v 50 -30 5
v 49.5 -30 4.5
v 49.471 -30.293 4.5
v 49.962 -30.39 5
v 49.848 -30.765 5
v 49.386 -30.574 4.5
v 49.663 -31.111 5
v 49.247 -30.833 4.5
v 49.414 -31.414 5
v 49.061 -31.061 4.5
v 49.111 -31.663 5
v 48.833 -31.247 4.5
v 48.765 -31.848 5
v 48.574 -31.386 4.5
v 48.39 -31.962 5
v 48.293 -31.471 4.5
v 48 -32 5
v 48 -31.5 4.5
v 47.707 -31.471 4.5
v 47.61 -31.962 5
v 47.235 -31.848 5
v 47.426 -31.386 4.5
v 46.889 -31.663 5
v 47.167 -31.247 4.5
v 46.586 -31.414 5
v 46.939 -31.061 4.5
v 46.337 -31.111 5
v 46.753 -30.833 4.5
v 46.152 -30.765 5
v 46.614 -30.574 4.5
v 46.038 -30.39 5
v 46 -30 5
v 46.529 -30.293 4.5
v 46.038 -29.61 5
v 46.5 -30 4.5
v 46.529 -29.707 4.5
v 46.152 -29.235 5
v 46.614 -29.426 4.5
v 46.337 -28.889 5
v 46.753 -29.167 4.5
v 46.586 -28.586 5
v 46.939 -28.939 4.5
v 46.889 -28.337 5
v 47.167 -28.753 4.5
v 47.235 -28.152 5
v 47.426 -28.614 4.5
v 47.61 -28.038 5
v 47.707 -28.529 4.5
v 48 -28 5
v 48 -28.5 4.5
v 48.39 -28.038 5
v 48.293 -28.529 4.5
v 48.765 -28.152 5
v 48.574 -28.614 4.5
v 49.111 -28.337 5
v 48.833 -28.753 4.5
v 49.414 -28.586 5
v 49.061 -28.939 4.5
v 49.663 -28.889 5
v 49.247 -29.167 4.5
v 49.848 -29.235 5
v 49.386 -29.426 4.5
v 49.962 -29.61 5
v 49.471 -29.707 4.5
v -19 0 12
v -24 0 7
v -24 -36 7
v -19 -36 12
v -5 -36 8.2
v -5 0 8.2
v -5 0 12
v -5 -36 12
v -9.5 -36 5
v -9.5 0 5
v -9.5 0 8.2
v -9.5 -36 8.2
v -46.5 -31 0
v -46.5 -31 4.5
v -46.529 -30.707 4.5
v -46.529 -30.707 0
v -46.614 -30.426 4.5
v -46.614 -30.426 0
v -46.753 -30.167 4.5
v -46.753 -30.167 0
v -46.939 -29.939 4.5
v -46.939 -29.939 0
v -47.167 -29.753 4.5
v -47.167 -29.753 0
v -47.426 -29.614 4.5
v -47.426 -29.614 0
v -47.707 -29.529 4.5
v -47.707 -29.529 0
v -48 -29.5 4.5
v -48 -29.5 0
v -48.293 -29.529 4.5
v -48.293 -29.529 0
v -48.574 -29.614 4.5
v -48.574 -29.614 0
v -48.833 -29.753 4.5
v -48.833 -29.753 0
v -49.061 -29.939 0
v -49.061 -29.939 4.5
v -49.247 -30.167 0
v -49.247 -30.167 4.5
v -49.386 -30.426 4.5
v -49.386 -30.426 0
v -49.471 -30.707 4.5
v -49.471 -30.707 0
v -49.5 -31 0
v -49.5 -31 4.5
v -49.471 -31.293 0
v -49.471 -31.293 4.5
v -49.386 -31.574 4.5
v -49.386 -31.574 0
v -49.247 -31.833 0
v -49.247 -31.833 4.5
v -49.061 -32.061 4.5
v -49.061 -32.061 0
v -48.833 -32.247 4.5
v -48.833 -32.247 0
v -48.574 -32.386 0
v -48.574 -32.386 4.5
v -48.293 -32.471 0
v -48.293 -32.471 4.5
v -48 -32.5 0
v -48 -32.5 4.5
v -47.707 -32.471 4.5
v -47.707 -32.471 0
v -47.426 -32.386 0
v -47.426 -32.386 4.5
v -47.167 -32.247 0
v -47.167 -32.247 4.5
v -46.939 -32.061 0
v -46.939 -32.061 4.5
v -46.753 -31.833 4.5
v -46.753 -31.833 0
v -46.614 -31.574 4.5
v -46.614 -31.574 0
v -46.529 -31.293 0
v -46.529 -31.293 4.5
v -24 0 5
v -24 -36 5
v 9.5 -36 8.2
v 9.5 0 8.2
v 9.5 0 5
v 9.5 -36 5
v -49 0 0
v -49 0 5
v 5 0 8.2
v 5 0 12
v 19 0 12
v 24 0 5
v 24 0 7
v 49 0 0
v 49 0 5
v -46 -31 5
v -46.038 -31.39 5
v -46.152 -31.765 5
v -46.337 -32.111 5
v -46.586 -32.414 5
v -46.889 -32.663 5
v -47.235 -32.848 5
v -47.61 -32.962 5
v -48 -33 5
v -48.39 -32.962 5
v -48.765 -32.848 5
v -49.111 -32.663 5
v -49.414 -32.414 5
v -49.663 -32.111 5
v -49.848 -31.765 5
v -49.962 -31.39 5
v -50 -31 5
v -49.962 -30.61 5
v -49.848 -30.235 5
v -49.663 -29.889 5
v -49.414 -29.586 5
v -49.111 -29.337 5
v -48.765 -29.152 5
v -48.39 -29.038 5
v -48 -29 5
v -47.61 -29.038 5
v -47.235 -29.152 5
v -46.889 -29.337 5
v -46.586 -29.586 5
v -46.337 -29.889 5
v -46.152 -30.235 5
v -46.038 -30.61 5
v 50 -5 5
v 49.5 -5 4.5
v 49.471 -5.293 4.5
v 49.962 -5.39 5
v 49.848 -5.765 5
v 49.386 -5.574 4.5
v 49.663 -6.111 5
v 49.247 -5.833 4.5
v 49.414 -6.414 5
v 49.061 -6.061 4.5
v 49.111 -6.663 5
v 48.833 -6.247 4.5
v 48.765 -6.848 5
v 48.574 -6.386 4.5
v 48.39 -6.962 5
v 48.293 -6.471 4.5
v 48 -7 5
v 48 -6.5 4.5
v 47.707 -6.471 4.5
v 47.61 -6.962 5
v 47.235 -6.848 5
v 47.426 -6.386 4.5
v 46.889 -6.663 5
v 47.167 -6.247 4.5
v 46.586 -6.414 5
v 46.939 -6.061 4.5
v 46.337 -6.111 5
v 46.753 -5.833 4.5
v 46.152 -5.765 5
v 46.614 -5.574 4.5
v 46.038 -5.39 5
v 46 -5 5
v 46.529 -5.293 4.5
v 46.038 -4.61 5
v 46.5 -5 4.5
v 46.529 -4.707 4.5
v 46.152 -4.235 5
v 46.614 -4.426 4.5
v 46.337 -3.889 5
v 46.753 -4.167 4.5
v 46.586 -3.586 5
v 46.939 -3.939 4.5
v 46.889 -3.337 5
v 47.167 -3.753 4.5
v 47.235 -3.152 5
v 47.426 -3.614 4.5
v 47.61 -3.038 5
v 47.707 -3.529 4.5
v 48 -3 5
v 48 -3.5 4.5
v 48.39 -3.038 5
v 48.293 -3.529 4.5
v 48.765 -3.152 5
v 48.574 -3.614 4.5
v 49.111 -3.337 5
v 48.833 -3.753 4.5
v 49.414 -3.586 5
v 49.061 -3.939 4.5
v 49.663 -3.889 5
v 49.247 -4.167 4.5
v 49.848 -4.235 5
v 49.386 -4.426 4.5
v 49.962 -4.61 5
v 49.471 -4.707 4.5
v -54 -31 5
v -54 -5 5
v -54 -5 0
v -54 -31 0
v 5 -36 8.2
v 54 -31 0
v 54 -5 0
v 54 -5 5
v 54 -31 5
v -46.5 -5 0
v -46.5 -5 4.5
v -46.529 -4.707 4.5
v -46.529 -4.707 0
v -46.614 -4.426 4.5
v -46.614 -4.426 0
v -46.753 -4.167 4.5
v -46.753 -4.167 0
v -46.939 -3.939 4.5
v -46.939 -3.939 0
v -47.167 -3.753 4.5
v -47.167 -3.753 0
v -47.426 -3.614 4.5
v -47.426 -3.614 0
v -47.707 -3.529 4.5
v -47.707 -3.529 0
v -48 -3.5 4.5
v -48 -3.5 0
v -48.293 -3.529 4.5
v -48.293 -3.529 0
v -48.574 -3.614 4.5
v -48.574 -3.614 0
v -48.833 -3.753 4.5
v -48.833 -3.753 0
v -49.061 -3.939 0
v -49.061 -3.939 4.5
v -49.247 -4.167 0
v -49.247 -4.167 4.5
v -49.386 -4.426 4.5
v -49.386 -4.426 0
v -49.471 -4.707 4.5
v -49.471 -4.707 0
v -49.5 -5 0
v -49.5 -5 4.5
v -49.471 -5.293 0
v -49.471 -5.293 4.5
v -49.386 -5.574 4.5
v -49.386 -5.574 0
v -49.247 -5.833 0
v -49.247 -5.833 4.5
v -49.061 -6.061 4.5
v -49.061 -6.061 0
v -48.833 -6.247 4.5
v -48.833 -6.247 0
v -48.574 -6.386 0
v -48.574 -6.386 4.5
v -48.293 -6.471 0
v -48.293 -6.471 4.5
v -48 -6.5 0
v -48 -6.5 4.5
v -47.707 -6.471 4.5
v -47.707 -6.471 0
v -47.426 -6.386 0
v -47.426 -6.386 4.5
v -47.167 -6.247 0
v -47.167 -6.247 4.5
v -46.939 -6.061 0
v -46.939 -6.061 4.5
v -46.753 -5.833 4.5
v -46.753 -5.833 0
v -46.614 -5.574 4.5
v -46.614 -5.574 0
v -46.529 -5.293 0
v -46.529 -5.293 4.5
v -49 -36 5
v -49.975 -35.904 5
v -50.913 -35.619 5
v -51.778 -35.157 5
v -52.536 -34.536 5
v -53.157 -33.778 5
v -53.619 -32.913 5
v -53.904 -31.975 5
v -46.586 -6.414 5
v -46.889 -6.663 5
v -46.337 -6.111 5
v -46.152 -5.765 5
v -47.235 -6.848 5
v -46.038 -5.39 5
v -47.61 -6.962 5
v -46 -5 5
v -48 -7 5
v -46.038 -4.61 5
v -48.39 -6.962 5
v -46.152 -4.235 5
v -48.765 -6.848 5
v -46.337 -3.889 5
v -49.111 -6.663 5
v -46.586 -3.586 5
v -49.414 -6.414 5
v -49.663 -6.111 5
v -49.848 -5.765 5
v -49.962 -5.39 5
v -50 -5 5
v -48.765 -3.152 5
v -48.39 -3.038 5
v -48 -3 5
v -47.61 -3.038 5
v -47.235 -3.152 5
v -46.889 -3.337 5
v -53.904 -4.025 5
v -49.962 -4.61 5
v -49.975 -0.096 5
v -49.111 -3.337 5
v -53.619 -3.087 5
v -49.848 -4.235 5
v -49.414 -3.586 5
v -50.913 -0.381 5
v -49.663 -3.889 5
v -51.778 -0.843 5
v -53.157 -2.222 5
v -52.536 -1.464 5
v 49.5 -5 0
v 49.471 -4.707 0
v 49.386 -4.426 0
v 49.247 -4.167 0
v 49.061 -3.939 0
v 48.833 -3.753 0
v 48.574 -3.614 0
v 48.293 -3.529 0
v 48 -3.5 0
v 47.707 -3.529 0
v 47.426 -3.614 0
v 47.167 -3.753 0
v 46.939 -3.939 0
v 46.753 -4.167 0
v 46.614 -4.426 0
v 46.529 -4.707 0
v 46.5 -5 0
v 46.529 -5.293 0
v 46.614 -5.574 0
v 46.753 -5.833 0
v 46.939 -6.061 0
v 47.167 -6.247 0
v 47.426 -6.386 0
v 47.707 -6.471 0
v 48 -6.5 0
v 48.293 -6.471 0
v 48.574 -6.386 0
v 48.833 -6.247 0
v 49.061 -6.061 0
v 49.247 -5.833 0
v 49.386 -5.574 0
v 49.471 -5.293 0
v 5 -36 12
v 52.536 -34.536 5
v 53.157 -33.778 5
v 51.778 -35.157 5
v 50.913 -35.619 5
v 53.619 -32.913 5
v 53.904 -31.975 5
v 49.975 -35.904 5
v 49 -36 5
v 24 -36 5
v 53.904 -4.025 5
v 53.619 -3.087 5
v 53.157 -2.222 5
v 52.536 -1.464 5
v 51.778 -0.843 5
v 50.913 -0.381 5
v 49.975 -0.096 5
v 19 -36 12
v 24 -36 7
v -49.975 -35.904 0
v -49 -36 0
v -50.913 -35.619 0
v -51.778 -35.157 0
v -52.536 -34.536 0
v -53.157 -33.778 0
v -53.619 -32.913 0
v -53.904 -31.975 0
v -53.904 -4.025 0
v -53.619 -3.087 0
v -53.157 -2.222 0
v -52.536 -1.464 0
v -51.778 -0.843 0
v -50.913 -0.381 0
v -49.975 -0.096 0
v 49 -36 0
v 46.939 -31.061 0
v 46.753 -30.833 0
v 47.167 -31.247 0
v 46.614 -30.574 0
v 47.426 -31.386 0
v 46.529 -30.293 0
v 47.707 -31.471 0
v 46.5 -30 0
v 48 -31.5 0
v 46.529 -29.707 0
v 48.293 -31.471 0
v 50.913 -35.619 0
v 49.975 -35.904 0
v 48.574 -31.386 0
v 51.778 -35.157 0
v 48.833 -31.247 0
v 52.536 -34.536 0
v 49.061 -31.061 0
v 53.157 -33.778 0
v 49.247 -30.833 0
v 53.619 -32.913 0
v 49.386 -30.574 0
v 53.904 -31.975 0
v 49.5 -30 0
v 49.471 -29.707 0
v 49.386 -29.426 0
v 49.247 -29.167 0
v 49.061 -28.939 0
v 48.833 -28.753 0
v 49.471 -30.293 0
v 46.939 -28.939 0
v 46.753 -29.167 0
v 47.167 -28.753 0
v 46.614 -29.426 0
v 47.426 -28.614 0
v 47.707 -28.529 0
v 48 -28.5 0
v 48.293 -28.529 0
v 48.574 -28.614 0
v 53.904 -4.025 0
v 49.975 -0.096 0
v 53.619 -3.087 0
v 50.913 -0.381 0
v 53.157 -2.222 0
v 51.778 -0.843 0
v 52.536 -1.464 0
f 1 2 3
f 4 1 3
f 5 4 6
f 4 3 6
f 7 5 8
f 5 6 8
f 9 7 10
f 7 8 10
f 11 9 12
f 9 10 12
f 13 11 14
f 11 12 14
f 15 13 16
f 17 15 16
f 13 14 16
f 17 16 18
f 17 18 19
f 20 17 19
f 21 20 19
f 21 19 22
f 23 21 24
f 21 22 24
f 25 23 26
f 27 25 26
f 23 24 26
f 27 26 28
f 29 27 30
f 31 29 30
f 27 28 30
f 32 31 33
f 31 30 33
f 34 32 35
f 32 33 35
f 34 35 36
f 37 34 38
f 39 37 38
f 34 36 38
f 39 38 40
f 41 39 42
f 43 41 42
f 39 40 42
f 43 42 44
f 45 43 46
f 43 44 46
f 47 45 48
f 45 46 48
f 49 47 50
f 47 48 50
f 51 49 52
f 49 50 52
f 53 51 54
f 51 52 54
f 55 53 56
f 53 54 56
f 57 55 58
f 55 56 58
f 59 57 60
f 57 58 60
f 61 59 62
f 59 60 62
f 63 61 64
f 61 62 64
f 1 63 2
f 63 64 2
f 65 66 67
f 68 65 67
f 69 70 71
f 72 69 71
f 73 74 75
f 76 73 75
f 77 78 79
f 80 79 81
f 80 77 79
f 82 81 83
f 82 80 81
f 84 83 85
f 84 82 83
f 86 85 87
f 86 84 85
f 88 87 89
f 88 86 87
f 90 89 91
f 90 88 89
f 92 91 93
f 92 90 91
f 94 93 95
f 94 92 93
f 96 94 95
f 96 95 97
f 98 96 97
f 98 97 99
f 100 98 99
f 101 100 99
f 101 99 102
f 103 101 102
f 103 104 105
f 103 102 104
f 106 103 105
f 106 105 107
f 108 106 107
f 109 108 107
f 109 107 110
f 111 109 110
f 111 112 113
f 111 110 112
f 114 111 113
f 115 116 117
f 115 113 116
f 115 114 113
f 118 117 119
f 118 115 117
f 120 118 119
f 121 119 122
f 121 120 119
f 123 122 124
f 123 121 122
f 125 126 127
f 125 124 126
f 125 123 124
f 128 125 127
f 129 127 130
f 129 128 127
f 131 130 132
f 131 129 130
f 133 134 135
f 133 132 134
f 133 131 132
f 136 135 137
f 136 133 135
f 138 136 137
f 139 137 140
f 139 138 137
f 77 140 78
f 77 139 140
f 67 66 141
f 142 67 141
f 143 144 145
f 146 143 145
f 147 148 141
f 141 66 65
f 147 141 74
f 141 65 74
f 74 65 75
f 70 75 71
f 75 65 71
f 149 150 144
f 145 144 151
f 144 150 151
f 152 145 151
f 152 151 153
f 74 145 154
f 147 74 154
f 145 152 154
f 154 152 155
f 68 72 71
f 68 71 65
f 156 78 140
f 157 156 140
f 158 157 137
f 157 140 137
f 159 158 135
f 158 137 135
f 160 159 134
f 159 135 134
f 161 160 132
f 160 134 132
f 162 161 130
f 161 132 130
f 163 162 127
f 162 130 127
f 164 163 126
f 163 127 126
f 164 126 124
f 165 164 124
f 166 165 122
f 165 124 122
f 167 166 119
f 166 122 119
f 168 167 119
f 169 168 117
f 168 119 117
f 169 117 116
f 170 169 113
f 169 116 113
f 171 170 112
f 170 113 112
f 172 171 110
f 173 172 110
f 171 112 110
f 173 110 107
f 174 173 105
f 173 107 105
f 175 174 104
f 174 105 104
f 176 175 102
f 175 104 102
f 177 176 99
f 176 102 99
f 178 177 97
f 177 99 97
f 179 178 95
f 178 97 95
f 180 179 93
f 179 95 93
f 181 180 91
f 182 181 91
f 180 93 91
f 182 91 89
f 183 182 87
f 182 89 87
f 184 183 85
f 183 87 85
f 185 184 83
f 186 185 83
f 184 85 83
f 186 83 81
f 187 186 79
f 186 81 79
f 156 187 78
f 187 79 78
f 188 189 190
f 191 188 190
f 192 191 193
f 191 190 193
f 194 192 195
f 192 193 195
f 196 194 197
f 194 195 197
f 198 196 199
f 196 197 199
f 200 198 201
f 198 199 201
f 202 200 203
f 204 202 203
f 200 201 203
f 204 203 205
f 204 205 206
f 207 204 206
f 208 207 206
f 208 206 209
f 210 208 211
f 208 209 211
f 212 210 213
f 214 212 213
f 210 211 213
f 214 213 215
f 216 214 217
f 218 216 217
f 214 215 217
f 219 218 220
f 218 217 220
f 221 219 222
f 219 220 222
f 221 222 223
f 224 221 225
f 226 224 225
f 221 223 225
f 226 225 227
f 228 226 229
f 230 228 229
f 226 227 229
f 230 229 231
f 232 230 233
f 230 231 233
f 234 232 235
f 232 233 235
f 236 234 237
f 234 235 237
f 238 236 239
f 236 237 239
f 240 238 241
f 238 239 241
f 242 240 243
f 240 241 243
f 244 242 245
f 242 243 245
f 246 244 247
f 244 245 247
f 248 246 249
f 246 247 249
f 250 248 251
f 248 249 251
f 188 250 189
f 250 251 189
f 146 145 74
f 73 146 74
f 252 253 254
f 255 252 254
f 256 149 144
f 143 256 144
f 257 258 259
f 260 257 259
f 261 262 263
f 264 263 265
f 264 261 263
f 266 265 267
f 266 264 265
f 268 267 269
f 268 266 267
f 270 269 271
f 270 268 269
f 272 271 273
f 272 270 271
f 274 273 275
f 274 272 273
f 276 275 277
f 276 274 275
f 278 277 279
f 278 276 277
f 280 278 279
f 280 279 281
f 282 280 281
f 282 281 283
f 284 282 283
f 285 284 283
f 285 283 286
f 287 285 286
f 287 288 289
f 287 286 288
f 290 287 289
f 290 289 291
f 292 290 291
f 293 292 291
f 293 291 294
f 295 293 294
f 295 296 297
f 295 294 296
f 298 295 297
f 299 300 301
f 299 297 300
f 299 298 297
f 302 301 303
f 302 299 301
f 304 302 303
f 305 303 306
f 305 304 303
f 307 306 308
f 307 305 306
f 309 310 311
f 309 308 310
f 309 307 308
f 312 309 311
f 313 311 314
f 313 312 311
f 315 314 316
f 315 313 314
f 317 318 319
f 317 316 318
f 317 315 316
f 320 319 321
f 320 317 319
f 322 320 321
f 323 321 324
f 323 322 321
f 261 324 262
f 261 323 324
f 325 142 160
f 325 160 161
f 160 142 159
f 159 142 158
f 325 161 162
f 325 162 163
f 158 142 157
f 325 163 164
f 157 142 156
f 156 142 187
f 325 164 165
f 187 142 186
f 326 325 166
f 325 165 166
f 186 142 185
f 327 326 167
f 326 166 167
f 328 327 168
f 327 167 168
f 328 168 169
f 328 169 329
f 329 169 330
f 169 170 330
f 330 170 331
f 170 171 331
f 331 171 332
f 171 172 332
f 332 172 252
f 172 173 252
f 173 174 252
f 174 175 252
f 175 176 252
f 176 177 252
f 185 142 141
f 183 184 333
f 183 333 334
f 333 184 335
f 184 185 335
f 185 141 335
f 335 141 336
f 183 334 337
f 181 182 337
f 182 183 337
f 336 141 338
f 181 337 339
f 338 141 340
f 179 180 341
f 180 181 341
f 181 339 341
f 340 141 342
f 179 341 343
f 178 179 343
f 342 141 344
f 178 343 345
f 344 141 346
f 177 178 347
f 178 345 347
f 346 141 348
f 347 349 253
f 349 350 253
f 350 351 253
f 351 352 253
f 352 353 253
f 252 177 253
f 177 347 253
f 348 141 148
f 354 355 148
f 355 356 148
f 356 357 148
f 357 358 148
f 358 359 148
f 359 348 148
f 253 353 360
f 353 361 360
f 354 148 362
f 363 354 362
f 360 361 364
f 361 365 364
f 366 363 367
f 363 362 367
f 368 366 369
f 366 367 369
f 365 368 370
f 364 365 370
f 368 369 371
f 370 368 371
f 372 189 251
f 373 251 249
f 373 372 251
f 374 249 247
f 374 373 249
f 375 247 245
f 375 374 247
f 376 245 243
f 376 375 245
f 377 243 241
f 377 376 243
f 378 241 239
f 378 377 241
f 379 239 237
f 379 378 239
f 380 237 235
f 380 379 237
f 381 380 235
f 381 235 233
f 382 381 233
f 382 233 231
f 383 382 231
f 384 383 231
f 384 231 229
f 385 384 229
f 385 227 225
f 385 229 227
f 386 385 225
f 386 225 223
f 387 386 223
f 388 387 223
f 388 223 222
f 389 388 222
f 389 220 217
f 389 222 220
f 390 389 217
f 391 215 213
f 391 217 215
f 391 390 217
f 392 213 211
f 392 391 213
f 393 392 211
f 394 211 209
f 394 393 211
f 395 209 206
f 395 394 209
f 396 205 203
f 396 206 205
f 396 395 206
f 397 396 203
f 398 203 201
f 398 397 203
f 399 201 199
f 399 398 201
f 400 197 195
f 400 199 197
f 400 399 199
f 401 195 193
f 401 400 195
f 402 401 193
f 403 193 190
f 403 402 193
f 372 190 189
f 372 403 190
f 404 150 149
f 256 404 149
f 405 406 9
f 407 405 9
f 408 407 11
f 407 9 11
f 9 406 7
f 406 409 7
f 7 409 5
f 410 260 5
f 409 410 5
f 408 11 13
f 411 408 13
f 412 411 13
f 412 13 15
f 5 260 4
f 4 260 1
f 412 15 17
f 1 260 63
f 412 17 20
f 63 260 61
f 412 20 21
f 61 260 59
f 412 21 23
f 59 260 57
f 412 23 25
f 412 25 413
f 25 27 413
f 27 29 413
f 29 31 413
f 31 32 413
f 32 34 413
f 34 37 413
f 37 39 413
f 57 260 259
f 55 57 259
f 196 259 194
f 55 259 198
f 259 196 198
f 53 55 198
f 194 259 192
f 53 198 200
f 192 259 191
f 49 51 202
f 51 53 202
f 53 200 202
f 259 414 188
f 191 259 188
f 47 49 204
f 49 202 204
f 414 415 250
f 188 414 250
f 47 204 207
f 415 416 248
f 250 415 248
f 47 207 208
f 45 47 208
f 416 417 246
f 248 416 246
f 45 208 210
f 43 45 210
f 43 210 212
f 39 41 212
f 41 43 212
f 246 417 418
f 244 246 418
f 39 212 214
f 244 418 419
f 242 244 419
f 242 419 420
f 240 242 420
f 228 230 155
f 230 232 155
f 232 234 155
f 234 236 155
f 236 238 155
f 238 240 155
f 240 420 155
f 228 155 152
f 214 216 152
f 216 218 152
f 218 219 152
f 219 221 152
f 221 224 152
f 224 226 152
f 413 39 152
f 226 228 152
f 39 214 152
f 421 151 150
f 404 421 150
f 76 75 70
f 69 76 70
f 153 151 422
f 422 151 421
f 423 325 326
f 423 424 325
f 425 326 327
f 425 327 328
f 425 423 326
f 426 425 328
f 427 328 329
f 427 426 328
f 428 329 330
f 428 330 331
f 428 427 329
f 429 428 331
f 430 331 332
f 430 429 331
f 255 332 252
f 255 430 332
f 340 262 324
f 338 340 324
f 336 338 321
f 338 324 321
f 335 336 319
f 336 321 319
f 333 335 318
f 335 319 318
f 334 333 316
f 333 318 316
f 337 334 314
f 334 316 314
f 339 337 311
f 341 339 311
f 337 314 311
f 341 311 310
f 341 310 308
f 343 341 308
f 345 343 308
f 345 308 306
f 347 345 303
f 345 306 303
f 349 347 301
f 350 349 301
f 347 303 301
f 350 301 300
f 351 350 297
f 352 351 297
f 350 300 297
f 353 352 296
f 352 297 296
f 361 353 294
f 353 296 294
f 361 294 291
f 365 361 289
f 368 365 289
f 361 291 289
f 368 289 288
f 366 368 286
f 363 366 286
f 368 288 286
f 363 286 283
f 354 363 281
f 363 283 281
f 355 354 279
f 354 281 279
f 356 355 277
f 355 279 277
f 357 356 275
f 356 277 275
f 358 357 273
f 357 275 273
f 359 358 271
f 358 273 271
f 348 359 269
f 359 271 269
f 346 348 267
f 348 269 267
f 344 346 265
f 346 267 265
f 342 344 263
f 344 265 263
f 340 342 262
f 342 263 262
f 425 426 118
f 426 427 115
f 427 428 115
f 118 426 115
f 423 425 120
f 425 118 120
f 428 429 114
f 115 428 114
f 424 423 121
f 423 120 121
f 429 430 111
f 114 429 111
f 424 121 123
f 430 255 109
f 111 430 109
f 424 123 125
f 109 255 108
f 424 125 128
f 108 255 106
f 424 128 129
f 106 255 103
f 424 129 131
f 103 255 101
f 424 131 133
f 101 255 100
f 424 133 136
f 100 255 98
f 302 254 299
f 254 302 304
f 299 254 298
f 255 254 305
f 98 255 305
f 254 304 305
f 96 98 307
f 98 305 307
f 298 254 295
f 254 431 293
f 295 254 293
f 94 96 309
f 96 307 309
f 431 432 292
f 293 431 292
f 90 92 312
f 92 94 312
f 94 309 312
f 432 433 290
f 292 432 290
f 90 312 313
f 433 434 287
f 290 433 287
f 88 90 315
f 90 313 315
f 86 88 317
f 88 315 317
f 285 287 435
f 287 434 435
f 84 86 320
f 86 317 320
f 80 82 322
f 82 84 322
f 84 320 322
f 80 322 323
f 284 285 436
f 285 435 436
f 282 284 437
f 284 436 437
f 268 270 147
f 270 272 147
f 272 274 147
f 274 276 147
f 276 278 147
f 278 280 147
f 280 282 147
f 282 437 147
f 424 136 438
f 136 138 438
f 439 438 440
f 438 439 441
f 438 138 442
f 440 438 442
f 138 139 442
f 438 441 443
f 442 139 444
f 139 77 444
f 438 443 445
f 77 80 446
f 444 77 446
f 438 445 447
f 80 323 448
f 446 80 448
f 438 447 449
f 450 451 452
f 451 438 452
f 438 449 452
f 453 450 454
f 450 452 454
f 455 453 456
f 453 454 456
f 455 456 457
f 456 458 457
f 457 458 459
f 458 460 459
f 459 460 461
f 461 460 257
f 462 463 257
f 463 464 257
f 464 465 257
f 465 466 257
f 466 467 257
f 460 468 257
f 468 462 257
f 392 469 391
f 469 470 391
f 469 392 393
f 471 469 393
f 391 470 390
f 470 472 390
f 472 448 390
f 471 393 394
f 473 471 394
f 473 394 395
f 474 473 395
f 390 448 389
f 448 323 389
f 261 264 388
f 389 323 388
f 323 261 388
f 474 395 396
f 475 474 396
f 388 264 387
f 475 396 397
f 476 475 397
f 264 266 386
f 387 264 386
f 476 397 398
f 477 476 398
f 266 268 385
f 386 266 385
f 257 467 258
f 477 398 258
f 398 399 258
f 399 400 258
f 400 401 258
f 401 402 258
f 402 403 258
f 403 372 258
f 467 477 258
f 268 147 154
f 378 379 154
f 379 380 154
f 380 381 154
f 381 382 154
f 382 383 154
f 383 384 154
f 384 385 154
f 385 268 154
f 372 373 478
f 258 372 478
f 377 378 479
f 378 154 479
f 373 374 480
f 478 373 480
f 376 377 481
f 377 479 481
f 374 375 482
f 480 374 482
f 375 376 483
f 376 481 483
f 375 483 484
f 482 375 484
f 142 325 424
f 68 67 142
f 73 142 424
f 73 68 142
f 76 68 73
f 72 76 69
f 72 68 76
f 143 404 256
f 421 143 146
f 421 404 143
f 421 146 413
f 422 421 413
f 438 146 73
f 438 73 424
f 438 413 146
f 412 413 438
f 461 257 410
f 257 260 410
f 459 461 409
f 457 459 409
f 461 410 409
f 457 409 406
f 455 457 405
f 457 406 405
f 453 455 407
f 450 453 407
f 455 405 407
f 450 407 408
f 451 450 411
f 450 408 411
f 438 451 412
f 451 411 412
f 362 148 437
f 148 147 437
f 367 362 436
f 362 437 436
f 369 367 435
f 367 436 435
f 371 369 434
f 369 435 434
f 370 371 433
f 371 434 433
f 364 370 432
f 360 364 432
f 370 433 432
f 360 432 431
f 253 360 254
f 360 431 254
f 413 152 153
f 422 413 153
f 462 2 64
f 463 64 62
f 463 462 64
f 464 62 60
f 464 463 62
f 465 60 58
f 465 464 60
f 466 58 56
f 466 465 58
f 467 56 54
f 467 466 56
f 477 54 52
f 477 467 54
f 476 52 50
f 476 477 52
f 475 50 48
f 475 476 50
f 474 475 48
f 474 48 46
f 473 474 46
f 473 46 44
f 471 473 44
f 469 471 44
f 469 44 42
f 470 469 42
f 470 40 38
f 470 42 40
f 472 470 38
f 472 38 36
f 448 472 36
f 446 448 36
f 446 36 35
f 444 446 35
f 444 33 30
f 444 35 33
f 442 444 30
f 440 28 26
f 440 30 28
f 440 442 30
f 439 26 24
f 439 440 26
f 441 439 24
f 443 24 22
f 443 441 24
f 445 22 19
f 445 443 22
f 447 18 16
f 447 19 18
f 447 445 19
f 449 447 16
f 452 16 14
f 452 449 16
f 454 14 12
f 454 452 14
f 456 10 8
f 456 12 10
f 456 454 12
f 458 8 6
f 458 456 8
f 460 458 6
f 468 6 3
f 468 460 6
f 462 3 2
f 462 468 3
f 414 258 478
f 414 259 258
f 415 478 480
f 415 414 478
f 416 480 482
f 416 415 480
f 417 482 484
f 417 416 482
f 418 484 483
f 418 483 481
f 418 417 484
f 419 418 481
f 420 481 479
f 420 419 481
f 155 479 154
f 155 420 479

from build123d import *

# Parameters (mm, degrees)
F1_DEPTH = 36
F2_SIZE  = 5
F3_R     = 1.5
F4_DEPTH = 13.1
F5_SIZE  = 0.5
F6_R     = 5


with BuildPart() as f1:
    # F0 (on Front) → F1 (new body)
    with BuildSketch(Plane.XZ):
        Polygon((-54, 0), (0, 0), (54, 0), (54, 5), (24, 5), (24, 12), (5, 12), (5, 8.2), (9.5, 8.2), (9.5, 5), (0, 5), (-9.5, 5), (-9.5, 8.2), (-5, 8.2), (-5, 12), (-24, 12), (-24, 5), (-54, 5), align=None)
    extrude(amount=F1_DEPTH)

    # F2
    f2_edges = [f1.edges().sort_by_distance(p)[0] for p in [
        (24, -18, 12),
        (-24, -18, 12),
    ]]
    chamfer(f2_edges, length=F2_SIZE)

    # F3 (on Top) → F4 (cut)
    with BuildSketch(Plane.XY):
        with Locations((-48, -5)):
            Circle(F3_R)
        with Locations((-48, -31)):
            Circle(F3_R)
        with Locations((48, -5)):
            Circle(F3_R)
        with Locations((48, -30)):
            Circle(F3_R)
    extrude(amount=F4_DEPTH, mode=Mode.SUBTRACT)

    # F5
    f5_edges = [f1.edges().sort_by_distance(p)[0] for p in [
        (-49.5, -5, 5),
        (-49.5, -31, 5),
        (46.5, -5, 5),
        (46.5, -30, 5),
    ]]
    chamfer(f5_edges, length=F5_SIZE)

    # F6
    f6_edges = [f1.edges().sort_by_distance(p)[0] for p in [
        (-54, 0, 2.5),
        (-54, -36, 2.5),
        (54, -36, 2.5),
        (54, 0, 2.5),
    ]]
    fillet(f6_edges, radius=F6_R)


solid = f1.part
